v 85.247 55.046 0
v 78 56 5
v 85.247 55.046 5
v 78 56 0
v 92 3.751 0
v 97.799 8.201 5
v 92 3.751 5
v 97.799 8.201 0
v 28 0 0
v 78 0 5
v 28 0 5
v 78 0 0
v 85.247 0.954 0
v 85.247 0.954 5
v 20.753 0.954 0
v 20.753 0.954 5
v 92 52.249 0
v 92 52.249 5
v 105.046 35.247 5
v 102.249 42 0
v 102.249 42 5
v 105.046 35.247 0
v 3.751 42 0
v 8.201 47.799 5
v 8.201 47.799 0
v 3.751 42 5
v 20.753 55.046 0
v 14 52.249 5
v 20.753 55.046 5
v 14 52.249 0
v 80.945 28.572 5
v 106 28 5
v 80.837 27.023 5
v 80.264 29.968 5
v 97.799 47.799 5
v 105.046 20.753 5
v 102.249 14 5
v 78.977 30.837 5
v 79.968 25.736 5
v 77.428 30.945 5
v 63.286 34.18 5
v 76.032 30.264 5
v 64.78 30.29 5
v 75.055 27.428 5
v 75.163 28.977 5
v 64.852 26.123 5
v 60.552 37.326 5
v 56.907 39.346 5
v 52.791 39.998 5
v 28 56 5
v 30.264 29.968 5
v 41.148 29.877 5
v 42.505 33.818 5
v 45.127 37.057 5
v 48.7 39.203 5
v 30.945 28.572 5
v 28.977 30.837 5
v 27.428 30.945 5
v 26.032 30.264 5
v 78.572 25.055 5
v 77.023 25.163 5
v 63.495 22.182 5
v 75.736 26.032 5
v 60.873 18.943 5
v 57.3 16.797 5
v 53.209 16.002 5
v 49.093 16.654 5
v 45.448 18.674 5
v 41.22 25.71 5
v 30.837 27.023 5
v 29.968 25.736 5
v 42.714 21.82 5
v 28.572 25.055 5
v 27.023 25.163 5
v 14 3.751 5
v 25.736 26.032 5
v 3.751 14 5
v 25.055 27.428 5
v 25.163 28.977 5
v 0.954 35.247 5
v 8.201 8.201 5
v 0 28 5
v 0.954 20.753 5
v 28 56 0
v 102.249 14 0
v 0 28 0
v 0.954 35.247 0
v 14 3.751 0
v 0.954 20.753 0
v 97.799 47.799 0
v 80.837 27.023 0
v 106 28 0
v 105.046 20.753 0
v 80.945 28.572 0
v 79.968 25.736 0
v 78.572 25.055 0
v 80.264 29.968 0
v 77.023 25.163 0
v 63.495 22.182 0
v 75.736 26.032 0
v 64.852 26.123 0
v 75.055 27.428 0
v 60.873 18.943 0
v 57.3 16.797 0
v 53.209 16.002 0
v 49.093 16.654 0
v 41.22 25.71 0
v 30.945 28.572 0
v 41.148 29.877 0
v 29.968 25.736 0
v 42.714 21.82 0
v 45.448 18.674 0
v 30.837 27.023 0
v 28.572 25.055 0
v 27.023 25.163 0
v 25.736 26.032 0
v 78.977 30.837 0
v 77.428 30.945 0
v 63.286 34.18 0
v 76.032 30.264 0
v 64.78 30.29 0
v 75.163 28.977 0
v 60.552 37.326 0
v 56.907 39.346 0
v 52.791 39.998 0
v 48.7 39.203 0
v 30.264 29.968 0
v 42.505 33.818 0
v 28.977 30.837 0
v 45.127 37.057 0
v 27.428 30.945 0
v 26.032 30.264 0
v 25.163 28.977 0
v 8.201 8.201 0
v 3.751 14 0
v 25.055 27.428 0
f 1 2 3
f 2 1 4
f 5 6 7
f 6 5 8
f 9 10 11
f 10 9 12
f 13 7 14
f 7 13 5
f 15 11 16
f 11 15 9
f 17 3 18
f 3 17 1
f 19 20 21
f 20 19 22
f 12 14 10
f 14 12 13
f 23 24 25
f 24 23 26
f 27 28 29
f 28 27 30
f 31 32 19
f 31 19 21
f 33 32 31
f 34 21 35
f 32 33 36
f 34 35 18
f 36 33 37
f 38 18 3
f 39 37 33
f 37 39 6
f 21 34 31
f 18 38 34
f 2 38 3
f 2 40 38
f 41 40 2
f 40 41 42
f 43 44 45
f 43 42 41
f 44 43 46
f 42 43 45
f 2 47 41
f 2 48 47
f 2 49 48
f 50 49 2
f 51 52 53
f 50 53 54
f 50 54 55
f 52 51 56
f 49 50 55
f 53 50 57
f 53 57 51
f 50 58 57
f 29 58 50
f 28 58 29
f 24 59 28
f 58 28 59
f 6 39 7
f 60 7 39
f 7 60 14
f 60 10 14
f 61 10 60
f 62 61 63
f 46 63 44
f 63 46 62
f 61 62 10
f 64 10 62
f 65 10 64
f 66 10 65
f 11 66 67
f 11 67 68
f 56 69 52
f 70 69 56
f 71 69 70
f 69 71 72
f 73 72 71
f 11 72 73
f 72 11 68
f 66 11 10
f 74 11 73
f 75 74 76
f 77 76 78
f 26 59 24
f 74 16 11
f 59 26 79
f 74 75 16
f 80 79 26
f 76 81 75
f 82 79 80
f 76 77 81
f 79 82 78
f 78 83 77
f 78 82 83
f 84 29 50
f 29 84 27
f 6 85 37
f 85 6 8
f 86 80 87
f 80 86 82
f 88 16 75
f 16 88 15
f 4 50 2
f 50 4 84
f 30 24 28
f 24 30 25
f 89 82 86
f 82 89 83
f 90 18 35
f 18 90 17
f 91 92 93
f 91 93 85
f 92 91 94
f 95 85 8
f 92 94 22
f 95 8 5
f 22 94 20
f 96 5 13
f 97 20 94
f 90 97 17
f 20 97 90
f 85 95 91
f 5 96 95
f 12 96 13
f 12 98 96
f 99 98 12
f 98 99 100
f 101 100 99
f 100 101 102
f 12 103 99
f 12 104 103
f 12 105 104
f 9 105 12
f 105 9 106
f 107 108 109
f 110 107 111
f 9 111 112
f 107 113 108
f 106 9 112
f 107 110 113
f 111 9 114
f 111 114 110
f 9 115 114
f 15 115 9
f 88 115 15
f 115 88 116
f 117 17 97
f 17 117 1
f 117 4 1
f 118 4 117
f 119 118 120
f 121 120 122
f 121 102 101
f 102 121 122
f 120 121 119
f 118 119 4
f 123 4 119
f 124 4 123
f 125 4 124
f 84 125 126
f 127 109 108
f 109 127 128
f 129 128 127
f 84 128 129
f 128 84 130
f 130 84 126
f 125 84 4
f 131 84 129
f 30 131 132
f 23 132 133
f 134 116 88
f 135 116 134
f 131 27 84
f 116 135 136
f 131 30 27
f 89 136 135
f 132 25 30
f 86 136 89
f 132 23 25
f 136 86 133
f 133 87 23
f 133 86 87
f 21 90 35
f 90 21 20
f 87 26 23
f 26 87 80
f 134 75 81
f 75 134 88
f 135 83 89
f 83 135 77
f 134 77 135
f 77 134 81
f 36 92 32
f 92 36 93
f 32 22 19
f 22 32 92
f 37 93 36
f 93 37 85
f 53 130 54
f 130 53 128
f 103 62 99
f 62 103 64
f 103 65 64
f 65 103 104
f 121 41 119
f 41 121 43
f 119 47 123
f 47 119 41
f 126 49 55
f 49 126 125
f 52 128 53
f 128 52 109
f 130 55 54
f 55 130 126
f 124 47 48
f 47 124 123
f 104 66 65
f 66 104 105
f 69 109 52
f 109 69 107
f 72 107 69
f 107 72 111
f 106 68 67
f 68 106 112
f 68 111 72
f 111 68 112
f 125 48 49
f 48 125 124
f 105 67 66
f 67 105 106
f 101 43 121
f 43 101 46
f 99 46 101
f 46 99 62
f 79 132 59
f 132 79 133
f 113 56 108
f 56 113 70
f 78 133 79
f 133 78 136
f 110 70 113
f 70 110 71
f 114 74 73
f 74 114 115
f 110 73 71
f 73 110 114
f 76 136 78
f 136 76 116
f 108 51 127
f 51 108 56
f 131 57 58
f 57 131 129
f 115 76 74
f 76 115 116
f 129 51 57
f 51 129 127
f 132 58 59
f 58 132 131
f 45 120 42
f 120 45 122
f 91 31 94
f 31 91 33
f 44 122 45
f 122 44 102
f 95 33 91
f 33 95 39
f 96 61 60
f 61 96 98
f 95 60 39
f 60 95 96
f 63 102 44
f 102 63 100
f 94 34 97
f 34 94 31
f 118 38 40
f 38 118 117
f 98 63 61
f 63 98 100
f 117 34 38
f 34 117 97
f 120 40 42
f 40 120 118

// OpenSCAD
$fn = 32;

// ----------------------------------------------------------------------
// Spacer plate: obround span 50, caps R28
// ----------------------------------------------------------------------

// --- parameters (mm) ---
bore_r = 12;              // centre bore radius
bolt_r = 3;               // bolt hole radius
plate_t = 5;              // plate thickness, Z (extrusion height)
span = 50;                // obround span
cap_r = 28;               // cap radius

profile = [[28, 56], [20.753, 55.046], [14, 52.249], [8.201, 47.799], [3.751, 42], [0.954, 35.247], [0, 28], [0.954, 20.753], [3.751, 14], [8.201, 8.201], [14, 3.751], [20.753, 0.954], [28, 0], [78, 0], [85.247, 0.954], [92, 3.751], [97.799, 8.201], [102.249, 14], [105.046, 20.753], [106, 28], [105.046, 35.247], [102.249, 42], [97.799, 47.799], [92, 52.249], [85.247, 55.046], [78, 56]];  // primary outline, 26 points, counter clockwise
void_1 = [[64.78, 30.29], [63.286, 34.18], [60.552, 37.326], [56.907, 39.346], [52.791, 39.998], [48.7, 39.203], [45.127, 37.057], [42.505, 33.818], [41.148, 29.877], [41.22, 25.71], [42.714, 21.82], [45.448, 18.674], [49.093, 16.654], [53.209, 16.002], [57.3, 16.797], [60.873, 18.943], [63.495, 22.182], [64.852, 26.123]];  // centre bore, 18 points
void_2 = [[30.945, 28.572], [30.264, 29.968], [28.977, 30.837], [27.428, 30.945], [26.032, 30.264], [25.163, 28.977], [25.055, 27.428], [25.736, 26.032], [27.023, 25.163], [28.572, 25.055], [29.968, 25.736], [30.837, 27.023]];  // end hole, 12 points
void_3 = [[80.945, 28.572], [80.264, 29.968], [78.977, 30.837], [77.428, 30.945], [76.032, 30.264], [75.163, 28.977], [75.055, 27.428], [75.736, 26.032], [77.023, 25.163], [78.572, 25.055], [79.968, 25.736], [80.837, 27.023]];  // end hole, 12 points

// --- the one profile operation ---
difference() {
  linear_extrude(height = plate_t) polygon(points = profile);
  translate([0, 0, -1])
    linear_extrude(height = plate_t + 2) polygon(points = void_1);
  translate([0, 0, -1])
    linear_extrude(height = plate_t + 2) polygon(points = void_2);
  translate([0, 0, -1])
    linear_extrude(height = plate_t + 2) polygon(points = void_3);
}
